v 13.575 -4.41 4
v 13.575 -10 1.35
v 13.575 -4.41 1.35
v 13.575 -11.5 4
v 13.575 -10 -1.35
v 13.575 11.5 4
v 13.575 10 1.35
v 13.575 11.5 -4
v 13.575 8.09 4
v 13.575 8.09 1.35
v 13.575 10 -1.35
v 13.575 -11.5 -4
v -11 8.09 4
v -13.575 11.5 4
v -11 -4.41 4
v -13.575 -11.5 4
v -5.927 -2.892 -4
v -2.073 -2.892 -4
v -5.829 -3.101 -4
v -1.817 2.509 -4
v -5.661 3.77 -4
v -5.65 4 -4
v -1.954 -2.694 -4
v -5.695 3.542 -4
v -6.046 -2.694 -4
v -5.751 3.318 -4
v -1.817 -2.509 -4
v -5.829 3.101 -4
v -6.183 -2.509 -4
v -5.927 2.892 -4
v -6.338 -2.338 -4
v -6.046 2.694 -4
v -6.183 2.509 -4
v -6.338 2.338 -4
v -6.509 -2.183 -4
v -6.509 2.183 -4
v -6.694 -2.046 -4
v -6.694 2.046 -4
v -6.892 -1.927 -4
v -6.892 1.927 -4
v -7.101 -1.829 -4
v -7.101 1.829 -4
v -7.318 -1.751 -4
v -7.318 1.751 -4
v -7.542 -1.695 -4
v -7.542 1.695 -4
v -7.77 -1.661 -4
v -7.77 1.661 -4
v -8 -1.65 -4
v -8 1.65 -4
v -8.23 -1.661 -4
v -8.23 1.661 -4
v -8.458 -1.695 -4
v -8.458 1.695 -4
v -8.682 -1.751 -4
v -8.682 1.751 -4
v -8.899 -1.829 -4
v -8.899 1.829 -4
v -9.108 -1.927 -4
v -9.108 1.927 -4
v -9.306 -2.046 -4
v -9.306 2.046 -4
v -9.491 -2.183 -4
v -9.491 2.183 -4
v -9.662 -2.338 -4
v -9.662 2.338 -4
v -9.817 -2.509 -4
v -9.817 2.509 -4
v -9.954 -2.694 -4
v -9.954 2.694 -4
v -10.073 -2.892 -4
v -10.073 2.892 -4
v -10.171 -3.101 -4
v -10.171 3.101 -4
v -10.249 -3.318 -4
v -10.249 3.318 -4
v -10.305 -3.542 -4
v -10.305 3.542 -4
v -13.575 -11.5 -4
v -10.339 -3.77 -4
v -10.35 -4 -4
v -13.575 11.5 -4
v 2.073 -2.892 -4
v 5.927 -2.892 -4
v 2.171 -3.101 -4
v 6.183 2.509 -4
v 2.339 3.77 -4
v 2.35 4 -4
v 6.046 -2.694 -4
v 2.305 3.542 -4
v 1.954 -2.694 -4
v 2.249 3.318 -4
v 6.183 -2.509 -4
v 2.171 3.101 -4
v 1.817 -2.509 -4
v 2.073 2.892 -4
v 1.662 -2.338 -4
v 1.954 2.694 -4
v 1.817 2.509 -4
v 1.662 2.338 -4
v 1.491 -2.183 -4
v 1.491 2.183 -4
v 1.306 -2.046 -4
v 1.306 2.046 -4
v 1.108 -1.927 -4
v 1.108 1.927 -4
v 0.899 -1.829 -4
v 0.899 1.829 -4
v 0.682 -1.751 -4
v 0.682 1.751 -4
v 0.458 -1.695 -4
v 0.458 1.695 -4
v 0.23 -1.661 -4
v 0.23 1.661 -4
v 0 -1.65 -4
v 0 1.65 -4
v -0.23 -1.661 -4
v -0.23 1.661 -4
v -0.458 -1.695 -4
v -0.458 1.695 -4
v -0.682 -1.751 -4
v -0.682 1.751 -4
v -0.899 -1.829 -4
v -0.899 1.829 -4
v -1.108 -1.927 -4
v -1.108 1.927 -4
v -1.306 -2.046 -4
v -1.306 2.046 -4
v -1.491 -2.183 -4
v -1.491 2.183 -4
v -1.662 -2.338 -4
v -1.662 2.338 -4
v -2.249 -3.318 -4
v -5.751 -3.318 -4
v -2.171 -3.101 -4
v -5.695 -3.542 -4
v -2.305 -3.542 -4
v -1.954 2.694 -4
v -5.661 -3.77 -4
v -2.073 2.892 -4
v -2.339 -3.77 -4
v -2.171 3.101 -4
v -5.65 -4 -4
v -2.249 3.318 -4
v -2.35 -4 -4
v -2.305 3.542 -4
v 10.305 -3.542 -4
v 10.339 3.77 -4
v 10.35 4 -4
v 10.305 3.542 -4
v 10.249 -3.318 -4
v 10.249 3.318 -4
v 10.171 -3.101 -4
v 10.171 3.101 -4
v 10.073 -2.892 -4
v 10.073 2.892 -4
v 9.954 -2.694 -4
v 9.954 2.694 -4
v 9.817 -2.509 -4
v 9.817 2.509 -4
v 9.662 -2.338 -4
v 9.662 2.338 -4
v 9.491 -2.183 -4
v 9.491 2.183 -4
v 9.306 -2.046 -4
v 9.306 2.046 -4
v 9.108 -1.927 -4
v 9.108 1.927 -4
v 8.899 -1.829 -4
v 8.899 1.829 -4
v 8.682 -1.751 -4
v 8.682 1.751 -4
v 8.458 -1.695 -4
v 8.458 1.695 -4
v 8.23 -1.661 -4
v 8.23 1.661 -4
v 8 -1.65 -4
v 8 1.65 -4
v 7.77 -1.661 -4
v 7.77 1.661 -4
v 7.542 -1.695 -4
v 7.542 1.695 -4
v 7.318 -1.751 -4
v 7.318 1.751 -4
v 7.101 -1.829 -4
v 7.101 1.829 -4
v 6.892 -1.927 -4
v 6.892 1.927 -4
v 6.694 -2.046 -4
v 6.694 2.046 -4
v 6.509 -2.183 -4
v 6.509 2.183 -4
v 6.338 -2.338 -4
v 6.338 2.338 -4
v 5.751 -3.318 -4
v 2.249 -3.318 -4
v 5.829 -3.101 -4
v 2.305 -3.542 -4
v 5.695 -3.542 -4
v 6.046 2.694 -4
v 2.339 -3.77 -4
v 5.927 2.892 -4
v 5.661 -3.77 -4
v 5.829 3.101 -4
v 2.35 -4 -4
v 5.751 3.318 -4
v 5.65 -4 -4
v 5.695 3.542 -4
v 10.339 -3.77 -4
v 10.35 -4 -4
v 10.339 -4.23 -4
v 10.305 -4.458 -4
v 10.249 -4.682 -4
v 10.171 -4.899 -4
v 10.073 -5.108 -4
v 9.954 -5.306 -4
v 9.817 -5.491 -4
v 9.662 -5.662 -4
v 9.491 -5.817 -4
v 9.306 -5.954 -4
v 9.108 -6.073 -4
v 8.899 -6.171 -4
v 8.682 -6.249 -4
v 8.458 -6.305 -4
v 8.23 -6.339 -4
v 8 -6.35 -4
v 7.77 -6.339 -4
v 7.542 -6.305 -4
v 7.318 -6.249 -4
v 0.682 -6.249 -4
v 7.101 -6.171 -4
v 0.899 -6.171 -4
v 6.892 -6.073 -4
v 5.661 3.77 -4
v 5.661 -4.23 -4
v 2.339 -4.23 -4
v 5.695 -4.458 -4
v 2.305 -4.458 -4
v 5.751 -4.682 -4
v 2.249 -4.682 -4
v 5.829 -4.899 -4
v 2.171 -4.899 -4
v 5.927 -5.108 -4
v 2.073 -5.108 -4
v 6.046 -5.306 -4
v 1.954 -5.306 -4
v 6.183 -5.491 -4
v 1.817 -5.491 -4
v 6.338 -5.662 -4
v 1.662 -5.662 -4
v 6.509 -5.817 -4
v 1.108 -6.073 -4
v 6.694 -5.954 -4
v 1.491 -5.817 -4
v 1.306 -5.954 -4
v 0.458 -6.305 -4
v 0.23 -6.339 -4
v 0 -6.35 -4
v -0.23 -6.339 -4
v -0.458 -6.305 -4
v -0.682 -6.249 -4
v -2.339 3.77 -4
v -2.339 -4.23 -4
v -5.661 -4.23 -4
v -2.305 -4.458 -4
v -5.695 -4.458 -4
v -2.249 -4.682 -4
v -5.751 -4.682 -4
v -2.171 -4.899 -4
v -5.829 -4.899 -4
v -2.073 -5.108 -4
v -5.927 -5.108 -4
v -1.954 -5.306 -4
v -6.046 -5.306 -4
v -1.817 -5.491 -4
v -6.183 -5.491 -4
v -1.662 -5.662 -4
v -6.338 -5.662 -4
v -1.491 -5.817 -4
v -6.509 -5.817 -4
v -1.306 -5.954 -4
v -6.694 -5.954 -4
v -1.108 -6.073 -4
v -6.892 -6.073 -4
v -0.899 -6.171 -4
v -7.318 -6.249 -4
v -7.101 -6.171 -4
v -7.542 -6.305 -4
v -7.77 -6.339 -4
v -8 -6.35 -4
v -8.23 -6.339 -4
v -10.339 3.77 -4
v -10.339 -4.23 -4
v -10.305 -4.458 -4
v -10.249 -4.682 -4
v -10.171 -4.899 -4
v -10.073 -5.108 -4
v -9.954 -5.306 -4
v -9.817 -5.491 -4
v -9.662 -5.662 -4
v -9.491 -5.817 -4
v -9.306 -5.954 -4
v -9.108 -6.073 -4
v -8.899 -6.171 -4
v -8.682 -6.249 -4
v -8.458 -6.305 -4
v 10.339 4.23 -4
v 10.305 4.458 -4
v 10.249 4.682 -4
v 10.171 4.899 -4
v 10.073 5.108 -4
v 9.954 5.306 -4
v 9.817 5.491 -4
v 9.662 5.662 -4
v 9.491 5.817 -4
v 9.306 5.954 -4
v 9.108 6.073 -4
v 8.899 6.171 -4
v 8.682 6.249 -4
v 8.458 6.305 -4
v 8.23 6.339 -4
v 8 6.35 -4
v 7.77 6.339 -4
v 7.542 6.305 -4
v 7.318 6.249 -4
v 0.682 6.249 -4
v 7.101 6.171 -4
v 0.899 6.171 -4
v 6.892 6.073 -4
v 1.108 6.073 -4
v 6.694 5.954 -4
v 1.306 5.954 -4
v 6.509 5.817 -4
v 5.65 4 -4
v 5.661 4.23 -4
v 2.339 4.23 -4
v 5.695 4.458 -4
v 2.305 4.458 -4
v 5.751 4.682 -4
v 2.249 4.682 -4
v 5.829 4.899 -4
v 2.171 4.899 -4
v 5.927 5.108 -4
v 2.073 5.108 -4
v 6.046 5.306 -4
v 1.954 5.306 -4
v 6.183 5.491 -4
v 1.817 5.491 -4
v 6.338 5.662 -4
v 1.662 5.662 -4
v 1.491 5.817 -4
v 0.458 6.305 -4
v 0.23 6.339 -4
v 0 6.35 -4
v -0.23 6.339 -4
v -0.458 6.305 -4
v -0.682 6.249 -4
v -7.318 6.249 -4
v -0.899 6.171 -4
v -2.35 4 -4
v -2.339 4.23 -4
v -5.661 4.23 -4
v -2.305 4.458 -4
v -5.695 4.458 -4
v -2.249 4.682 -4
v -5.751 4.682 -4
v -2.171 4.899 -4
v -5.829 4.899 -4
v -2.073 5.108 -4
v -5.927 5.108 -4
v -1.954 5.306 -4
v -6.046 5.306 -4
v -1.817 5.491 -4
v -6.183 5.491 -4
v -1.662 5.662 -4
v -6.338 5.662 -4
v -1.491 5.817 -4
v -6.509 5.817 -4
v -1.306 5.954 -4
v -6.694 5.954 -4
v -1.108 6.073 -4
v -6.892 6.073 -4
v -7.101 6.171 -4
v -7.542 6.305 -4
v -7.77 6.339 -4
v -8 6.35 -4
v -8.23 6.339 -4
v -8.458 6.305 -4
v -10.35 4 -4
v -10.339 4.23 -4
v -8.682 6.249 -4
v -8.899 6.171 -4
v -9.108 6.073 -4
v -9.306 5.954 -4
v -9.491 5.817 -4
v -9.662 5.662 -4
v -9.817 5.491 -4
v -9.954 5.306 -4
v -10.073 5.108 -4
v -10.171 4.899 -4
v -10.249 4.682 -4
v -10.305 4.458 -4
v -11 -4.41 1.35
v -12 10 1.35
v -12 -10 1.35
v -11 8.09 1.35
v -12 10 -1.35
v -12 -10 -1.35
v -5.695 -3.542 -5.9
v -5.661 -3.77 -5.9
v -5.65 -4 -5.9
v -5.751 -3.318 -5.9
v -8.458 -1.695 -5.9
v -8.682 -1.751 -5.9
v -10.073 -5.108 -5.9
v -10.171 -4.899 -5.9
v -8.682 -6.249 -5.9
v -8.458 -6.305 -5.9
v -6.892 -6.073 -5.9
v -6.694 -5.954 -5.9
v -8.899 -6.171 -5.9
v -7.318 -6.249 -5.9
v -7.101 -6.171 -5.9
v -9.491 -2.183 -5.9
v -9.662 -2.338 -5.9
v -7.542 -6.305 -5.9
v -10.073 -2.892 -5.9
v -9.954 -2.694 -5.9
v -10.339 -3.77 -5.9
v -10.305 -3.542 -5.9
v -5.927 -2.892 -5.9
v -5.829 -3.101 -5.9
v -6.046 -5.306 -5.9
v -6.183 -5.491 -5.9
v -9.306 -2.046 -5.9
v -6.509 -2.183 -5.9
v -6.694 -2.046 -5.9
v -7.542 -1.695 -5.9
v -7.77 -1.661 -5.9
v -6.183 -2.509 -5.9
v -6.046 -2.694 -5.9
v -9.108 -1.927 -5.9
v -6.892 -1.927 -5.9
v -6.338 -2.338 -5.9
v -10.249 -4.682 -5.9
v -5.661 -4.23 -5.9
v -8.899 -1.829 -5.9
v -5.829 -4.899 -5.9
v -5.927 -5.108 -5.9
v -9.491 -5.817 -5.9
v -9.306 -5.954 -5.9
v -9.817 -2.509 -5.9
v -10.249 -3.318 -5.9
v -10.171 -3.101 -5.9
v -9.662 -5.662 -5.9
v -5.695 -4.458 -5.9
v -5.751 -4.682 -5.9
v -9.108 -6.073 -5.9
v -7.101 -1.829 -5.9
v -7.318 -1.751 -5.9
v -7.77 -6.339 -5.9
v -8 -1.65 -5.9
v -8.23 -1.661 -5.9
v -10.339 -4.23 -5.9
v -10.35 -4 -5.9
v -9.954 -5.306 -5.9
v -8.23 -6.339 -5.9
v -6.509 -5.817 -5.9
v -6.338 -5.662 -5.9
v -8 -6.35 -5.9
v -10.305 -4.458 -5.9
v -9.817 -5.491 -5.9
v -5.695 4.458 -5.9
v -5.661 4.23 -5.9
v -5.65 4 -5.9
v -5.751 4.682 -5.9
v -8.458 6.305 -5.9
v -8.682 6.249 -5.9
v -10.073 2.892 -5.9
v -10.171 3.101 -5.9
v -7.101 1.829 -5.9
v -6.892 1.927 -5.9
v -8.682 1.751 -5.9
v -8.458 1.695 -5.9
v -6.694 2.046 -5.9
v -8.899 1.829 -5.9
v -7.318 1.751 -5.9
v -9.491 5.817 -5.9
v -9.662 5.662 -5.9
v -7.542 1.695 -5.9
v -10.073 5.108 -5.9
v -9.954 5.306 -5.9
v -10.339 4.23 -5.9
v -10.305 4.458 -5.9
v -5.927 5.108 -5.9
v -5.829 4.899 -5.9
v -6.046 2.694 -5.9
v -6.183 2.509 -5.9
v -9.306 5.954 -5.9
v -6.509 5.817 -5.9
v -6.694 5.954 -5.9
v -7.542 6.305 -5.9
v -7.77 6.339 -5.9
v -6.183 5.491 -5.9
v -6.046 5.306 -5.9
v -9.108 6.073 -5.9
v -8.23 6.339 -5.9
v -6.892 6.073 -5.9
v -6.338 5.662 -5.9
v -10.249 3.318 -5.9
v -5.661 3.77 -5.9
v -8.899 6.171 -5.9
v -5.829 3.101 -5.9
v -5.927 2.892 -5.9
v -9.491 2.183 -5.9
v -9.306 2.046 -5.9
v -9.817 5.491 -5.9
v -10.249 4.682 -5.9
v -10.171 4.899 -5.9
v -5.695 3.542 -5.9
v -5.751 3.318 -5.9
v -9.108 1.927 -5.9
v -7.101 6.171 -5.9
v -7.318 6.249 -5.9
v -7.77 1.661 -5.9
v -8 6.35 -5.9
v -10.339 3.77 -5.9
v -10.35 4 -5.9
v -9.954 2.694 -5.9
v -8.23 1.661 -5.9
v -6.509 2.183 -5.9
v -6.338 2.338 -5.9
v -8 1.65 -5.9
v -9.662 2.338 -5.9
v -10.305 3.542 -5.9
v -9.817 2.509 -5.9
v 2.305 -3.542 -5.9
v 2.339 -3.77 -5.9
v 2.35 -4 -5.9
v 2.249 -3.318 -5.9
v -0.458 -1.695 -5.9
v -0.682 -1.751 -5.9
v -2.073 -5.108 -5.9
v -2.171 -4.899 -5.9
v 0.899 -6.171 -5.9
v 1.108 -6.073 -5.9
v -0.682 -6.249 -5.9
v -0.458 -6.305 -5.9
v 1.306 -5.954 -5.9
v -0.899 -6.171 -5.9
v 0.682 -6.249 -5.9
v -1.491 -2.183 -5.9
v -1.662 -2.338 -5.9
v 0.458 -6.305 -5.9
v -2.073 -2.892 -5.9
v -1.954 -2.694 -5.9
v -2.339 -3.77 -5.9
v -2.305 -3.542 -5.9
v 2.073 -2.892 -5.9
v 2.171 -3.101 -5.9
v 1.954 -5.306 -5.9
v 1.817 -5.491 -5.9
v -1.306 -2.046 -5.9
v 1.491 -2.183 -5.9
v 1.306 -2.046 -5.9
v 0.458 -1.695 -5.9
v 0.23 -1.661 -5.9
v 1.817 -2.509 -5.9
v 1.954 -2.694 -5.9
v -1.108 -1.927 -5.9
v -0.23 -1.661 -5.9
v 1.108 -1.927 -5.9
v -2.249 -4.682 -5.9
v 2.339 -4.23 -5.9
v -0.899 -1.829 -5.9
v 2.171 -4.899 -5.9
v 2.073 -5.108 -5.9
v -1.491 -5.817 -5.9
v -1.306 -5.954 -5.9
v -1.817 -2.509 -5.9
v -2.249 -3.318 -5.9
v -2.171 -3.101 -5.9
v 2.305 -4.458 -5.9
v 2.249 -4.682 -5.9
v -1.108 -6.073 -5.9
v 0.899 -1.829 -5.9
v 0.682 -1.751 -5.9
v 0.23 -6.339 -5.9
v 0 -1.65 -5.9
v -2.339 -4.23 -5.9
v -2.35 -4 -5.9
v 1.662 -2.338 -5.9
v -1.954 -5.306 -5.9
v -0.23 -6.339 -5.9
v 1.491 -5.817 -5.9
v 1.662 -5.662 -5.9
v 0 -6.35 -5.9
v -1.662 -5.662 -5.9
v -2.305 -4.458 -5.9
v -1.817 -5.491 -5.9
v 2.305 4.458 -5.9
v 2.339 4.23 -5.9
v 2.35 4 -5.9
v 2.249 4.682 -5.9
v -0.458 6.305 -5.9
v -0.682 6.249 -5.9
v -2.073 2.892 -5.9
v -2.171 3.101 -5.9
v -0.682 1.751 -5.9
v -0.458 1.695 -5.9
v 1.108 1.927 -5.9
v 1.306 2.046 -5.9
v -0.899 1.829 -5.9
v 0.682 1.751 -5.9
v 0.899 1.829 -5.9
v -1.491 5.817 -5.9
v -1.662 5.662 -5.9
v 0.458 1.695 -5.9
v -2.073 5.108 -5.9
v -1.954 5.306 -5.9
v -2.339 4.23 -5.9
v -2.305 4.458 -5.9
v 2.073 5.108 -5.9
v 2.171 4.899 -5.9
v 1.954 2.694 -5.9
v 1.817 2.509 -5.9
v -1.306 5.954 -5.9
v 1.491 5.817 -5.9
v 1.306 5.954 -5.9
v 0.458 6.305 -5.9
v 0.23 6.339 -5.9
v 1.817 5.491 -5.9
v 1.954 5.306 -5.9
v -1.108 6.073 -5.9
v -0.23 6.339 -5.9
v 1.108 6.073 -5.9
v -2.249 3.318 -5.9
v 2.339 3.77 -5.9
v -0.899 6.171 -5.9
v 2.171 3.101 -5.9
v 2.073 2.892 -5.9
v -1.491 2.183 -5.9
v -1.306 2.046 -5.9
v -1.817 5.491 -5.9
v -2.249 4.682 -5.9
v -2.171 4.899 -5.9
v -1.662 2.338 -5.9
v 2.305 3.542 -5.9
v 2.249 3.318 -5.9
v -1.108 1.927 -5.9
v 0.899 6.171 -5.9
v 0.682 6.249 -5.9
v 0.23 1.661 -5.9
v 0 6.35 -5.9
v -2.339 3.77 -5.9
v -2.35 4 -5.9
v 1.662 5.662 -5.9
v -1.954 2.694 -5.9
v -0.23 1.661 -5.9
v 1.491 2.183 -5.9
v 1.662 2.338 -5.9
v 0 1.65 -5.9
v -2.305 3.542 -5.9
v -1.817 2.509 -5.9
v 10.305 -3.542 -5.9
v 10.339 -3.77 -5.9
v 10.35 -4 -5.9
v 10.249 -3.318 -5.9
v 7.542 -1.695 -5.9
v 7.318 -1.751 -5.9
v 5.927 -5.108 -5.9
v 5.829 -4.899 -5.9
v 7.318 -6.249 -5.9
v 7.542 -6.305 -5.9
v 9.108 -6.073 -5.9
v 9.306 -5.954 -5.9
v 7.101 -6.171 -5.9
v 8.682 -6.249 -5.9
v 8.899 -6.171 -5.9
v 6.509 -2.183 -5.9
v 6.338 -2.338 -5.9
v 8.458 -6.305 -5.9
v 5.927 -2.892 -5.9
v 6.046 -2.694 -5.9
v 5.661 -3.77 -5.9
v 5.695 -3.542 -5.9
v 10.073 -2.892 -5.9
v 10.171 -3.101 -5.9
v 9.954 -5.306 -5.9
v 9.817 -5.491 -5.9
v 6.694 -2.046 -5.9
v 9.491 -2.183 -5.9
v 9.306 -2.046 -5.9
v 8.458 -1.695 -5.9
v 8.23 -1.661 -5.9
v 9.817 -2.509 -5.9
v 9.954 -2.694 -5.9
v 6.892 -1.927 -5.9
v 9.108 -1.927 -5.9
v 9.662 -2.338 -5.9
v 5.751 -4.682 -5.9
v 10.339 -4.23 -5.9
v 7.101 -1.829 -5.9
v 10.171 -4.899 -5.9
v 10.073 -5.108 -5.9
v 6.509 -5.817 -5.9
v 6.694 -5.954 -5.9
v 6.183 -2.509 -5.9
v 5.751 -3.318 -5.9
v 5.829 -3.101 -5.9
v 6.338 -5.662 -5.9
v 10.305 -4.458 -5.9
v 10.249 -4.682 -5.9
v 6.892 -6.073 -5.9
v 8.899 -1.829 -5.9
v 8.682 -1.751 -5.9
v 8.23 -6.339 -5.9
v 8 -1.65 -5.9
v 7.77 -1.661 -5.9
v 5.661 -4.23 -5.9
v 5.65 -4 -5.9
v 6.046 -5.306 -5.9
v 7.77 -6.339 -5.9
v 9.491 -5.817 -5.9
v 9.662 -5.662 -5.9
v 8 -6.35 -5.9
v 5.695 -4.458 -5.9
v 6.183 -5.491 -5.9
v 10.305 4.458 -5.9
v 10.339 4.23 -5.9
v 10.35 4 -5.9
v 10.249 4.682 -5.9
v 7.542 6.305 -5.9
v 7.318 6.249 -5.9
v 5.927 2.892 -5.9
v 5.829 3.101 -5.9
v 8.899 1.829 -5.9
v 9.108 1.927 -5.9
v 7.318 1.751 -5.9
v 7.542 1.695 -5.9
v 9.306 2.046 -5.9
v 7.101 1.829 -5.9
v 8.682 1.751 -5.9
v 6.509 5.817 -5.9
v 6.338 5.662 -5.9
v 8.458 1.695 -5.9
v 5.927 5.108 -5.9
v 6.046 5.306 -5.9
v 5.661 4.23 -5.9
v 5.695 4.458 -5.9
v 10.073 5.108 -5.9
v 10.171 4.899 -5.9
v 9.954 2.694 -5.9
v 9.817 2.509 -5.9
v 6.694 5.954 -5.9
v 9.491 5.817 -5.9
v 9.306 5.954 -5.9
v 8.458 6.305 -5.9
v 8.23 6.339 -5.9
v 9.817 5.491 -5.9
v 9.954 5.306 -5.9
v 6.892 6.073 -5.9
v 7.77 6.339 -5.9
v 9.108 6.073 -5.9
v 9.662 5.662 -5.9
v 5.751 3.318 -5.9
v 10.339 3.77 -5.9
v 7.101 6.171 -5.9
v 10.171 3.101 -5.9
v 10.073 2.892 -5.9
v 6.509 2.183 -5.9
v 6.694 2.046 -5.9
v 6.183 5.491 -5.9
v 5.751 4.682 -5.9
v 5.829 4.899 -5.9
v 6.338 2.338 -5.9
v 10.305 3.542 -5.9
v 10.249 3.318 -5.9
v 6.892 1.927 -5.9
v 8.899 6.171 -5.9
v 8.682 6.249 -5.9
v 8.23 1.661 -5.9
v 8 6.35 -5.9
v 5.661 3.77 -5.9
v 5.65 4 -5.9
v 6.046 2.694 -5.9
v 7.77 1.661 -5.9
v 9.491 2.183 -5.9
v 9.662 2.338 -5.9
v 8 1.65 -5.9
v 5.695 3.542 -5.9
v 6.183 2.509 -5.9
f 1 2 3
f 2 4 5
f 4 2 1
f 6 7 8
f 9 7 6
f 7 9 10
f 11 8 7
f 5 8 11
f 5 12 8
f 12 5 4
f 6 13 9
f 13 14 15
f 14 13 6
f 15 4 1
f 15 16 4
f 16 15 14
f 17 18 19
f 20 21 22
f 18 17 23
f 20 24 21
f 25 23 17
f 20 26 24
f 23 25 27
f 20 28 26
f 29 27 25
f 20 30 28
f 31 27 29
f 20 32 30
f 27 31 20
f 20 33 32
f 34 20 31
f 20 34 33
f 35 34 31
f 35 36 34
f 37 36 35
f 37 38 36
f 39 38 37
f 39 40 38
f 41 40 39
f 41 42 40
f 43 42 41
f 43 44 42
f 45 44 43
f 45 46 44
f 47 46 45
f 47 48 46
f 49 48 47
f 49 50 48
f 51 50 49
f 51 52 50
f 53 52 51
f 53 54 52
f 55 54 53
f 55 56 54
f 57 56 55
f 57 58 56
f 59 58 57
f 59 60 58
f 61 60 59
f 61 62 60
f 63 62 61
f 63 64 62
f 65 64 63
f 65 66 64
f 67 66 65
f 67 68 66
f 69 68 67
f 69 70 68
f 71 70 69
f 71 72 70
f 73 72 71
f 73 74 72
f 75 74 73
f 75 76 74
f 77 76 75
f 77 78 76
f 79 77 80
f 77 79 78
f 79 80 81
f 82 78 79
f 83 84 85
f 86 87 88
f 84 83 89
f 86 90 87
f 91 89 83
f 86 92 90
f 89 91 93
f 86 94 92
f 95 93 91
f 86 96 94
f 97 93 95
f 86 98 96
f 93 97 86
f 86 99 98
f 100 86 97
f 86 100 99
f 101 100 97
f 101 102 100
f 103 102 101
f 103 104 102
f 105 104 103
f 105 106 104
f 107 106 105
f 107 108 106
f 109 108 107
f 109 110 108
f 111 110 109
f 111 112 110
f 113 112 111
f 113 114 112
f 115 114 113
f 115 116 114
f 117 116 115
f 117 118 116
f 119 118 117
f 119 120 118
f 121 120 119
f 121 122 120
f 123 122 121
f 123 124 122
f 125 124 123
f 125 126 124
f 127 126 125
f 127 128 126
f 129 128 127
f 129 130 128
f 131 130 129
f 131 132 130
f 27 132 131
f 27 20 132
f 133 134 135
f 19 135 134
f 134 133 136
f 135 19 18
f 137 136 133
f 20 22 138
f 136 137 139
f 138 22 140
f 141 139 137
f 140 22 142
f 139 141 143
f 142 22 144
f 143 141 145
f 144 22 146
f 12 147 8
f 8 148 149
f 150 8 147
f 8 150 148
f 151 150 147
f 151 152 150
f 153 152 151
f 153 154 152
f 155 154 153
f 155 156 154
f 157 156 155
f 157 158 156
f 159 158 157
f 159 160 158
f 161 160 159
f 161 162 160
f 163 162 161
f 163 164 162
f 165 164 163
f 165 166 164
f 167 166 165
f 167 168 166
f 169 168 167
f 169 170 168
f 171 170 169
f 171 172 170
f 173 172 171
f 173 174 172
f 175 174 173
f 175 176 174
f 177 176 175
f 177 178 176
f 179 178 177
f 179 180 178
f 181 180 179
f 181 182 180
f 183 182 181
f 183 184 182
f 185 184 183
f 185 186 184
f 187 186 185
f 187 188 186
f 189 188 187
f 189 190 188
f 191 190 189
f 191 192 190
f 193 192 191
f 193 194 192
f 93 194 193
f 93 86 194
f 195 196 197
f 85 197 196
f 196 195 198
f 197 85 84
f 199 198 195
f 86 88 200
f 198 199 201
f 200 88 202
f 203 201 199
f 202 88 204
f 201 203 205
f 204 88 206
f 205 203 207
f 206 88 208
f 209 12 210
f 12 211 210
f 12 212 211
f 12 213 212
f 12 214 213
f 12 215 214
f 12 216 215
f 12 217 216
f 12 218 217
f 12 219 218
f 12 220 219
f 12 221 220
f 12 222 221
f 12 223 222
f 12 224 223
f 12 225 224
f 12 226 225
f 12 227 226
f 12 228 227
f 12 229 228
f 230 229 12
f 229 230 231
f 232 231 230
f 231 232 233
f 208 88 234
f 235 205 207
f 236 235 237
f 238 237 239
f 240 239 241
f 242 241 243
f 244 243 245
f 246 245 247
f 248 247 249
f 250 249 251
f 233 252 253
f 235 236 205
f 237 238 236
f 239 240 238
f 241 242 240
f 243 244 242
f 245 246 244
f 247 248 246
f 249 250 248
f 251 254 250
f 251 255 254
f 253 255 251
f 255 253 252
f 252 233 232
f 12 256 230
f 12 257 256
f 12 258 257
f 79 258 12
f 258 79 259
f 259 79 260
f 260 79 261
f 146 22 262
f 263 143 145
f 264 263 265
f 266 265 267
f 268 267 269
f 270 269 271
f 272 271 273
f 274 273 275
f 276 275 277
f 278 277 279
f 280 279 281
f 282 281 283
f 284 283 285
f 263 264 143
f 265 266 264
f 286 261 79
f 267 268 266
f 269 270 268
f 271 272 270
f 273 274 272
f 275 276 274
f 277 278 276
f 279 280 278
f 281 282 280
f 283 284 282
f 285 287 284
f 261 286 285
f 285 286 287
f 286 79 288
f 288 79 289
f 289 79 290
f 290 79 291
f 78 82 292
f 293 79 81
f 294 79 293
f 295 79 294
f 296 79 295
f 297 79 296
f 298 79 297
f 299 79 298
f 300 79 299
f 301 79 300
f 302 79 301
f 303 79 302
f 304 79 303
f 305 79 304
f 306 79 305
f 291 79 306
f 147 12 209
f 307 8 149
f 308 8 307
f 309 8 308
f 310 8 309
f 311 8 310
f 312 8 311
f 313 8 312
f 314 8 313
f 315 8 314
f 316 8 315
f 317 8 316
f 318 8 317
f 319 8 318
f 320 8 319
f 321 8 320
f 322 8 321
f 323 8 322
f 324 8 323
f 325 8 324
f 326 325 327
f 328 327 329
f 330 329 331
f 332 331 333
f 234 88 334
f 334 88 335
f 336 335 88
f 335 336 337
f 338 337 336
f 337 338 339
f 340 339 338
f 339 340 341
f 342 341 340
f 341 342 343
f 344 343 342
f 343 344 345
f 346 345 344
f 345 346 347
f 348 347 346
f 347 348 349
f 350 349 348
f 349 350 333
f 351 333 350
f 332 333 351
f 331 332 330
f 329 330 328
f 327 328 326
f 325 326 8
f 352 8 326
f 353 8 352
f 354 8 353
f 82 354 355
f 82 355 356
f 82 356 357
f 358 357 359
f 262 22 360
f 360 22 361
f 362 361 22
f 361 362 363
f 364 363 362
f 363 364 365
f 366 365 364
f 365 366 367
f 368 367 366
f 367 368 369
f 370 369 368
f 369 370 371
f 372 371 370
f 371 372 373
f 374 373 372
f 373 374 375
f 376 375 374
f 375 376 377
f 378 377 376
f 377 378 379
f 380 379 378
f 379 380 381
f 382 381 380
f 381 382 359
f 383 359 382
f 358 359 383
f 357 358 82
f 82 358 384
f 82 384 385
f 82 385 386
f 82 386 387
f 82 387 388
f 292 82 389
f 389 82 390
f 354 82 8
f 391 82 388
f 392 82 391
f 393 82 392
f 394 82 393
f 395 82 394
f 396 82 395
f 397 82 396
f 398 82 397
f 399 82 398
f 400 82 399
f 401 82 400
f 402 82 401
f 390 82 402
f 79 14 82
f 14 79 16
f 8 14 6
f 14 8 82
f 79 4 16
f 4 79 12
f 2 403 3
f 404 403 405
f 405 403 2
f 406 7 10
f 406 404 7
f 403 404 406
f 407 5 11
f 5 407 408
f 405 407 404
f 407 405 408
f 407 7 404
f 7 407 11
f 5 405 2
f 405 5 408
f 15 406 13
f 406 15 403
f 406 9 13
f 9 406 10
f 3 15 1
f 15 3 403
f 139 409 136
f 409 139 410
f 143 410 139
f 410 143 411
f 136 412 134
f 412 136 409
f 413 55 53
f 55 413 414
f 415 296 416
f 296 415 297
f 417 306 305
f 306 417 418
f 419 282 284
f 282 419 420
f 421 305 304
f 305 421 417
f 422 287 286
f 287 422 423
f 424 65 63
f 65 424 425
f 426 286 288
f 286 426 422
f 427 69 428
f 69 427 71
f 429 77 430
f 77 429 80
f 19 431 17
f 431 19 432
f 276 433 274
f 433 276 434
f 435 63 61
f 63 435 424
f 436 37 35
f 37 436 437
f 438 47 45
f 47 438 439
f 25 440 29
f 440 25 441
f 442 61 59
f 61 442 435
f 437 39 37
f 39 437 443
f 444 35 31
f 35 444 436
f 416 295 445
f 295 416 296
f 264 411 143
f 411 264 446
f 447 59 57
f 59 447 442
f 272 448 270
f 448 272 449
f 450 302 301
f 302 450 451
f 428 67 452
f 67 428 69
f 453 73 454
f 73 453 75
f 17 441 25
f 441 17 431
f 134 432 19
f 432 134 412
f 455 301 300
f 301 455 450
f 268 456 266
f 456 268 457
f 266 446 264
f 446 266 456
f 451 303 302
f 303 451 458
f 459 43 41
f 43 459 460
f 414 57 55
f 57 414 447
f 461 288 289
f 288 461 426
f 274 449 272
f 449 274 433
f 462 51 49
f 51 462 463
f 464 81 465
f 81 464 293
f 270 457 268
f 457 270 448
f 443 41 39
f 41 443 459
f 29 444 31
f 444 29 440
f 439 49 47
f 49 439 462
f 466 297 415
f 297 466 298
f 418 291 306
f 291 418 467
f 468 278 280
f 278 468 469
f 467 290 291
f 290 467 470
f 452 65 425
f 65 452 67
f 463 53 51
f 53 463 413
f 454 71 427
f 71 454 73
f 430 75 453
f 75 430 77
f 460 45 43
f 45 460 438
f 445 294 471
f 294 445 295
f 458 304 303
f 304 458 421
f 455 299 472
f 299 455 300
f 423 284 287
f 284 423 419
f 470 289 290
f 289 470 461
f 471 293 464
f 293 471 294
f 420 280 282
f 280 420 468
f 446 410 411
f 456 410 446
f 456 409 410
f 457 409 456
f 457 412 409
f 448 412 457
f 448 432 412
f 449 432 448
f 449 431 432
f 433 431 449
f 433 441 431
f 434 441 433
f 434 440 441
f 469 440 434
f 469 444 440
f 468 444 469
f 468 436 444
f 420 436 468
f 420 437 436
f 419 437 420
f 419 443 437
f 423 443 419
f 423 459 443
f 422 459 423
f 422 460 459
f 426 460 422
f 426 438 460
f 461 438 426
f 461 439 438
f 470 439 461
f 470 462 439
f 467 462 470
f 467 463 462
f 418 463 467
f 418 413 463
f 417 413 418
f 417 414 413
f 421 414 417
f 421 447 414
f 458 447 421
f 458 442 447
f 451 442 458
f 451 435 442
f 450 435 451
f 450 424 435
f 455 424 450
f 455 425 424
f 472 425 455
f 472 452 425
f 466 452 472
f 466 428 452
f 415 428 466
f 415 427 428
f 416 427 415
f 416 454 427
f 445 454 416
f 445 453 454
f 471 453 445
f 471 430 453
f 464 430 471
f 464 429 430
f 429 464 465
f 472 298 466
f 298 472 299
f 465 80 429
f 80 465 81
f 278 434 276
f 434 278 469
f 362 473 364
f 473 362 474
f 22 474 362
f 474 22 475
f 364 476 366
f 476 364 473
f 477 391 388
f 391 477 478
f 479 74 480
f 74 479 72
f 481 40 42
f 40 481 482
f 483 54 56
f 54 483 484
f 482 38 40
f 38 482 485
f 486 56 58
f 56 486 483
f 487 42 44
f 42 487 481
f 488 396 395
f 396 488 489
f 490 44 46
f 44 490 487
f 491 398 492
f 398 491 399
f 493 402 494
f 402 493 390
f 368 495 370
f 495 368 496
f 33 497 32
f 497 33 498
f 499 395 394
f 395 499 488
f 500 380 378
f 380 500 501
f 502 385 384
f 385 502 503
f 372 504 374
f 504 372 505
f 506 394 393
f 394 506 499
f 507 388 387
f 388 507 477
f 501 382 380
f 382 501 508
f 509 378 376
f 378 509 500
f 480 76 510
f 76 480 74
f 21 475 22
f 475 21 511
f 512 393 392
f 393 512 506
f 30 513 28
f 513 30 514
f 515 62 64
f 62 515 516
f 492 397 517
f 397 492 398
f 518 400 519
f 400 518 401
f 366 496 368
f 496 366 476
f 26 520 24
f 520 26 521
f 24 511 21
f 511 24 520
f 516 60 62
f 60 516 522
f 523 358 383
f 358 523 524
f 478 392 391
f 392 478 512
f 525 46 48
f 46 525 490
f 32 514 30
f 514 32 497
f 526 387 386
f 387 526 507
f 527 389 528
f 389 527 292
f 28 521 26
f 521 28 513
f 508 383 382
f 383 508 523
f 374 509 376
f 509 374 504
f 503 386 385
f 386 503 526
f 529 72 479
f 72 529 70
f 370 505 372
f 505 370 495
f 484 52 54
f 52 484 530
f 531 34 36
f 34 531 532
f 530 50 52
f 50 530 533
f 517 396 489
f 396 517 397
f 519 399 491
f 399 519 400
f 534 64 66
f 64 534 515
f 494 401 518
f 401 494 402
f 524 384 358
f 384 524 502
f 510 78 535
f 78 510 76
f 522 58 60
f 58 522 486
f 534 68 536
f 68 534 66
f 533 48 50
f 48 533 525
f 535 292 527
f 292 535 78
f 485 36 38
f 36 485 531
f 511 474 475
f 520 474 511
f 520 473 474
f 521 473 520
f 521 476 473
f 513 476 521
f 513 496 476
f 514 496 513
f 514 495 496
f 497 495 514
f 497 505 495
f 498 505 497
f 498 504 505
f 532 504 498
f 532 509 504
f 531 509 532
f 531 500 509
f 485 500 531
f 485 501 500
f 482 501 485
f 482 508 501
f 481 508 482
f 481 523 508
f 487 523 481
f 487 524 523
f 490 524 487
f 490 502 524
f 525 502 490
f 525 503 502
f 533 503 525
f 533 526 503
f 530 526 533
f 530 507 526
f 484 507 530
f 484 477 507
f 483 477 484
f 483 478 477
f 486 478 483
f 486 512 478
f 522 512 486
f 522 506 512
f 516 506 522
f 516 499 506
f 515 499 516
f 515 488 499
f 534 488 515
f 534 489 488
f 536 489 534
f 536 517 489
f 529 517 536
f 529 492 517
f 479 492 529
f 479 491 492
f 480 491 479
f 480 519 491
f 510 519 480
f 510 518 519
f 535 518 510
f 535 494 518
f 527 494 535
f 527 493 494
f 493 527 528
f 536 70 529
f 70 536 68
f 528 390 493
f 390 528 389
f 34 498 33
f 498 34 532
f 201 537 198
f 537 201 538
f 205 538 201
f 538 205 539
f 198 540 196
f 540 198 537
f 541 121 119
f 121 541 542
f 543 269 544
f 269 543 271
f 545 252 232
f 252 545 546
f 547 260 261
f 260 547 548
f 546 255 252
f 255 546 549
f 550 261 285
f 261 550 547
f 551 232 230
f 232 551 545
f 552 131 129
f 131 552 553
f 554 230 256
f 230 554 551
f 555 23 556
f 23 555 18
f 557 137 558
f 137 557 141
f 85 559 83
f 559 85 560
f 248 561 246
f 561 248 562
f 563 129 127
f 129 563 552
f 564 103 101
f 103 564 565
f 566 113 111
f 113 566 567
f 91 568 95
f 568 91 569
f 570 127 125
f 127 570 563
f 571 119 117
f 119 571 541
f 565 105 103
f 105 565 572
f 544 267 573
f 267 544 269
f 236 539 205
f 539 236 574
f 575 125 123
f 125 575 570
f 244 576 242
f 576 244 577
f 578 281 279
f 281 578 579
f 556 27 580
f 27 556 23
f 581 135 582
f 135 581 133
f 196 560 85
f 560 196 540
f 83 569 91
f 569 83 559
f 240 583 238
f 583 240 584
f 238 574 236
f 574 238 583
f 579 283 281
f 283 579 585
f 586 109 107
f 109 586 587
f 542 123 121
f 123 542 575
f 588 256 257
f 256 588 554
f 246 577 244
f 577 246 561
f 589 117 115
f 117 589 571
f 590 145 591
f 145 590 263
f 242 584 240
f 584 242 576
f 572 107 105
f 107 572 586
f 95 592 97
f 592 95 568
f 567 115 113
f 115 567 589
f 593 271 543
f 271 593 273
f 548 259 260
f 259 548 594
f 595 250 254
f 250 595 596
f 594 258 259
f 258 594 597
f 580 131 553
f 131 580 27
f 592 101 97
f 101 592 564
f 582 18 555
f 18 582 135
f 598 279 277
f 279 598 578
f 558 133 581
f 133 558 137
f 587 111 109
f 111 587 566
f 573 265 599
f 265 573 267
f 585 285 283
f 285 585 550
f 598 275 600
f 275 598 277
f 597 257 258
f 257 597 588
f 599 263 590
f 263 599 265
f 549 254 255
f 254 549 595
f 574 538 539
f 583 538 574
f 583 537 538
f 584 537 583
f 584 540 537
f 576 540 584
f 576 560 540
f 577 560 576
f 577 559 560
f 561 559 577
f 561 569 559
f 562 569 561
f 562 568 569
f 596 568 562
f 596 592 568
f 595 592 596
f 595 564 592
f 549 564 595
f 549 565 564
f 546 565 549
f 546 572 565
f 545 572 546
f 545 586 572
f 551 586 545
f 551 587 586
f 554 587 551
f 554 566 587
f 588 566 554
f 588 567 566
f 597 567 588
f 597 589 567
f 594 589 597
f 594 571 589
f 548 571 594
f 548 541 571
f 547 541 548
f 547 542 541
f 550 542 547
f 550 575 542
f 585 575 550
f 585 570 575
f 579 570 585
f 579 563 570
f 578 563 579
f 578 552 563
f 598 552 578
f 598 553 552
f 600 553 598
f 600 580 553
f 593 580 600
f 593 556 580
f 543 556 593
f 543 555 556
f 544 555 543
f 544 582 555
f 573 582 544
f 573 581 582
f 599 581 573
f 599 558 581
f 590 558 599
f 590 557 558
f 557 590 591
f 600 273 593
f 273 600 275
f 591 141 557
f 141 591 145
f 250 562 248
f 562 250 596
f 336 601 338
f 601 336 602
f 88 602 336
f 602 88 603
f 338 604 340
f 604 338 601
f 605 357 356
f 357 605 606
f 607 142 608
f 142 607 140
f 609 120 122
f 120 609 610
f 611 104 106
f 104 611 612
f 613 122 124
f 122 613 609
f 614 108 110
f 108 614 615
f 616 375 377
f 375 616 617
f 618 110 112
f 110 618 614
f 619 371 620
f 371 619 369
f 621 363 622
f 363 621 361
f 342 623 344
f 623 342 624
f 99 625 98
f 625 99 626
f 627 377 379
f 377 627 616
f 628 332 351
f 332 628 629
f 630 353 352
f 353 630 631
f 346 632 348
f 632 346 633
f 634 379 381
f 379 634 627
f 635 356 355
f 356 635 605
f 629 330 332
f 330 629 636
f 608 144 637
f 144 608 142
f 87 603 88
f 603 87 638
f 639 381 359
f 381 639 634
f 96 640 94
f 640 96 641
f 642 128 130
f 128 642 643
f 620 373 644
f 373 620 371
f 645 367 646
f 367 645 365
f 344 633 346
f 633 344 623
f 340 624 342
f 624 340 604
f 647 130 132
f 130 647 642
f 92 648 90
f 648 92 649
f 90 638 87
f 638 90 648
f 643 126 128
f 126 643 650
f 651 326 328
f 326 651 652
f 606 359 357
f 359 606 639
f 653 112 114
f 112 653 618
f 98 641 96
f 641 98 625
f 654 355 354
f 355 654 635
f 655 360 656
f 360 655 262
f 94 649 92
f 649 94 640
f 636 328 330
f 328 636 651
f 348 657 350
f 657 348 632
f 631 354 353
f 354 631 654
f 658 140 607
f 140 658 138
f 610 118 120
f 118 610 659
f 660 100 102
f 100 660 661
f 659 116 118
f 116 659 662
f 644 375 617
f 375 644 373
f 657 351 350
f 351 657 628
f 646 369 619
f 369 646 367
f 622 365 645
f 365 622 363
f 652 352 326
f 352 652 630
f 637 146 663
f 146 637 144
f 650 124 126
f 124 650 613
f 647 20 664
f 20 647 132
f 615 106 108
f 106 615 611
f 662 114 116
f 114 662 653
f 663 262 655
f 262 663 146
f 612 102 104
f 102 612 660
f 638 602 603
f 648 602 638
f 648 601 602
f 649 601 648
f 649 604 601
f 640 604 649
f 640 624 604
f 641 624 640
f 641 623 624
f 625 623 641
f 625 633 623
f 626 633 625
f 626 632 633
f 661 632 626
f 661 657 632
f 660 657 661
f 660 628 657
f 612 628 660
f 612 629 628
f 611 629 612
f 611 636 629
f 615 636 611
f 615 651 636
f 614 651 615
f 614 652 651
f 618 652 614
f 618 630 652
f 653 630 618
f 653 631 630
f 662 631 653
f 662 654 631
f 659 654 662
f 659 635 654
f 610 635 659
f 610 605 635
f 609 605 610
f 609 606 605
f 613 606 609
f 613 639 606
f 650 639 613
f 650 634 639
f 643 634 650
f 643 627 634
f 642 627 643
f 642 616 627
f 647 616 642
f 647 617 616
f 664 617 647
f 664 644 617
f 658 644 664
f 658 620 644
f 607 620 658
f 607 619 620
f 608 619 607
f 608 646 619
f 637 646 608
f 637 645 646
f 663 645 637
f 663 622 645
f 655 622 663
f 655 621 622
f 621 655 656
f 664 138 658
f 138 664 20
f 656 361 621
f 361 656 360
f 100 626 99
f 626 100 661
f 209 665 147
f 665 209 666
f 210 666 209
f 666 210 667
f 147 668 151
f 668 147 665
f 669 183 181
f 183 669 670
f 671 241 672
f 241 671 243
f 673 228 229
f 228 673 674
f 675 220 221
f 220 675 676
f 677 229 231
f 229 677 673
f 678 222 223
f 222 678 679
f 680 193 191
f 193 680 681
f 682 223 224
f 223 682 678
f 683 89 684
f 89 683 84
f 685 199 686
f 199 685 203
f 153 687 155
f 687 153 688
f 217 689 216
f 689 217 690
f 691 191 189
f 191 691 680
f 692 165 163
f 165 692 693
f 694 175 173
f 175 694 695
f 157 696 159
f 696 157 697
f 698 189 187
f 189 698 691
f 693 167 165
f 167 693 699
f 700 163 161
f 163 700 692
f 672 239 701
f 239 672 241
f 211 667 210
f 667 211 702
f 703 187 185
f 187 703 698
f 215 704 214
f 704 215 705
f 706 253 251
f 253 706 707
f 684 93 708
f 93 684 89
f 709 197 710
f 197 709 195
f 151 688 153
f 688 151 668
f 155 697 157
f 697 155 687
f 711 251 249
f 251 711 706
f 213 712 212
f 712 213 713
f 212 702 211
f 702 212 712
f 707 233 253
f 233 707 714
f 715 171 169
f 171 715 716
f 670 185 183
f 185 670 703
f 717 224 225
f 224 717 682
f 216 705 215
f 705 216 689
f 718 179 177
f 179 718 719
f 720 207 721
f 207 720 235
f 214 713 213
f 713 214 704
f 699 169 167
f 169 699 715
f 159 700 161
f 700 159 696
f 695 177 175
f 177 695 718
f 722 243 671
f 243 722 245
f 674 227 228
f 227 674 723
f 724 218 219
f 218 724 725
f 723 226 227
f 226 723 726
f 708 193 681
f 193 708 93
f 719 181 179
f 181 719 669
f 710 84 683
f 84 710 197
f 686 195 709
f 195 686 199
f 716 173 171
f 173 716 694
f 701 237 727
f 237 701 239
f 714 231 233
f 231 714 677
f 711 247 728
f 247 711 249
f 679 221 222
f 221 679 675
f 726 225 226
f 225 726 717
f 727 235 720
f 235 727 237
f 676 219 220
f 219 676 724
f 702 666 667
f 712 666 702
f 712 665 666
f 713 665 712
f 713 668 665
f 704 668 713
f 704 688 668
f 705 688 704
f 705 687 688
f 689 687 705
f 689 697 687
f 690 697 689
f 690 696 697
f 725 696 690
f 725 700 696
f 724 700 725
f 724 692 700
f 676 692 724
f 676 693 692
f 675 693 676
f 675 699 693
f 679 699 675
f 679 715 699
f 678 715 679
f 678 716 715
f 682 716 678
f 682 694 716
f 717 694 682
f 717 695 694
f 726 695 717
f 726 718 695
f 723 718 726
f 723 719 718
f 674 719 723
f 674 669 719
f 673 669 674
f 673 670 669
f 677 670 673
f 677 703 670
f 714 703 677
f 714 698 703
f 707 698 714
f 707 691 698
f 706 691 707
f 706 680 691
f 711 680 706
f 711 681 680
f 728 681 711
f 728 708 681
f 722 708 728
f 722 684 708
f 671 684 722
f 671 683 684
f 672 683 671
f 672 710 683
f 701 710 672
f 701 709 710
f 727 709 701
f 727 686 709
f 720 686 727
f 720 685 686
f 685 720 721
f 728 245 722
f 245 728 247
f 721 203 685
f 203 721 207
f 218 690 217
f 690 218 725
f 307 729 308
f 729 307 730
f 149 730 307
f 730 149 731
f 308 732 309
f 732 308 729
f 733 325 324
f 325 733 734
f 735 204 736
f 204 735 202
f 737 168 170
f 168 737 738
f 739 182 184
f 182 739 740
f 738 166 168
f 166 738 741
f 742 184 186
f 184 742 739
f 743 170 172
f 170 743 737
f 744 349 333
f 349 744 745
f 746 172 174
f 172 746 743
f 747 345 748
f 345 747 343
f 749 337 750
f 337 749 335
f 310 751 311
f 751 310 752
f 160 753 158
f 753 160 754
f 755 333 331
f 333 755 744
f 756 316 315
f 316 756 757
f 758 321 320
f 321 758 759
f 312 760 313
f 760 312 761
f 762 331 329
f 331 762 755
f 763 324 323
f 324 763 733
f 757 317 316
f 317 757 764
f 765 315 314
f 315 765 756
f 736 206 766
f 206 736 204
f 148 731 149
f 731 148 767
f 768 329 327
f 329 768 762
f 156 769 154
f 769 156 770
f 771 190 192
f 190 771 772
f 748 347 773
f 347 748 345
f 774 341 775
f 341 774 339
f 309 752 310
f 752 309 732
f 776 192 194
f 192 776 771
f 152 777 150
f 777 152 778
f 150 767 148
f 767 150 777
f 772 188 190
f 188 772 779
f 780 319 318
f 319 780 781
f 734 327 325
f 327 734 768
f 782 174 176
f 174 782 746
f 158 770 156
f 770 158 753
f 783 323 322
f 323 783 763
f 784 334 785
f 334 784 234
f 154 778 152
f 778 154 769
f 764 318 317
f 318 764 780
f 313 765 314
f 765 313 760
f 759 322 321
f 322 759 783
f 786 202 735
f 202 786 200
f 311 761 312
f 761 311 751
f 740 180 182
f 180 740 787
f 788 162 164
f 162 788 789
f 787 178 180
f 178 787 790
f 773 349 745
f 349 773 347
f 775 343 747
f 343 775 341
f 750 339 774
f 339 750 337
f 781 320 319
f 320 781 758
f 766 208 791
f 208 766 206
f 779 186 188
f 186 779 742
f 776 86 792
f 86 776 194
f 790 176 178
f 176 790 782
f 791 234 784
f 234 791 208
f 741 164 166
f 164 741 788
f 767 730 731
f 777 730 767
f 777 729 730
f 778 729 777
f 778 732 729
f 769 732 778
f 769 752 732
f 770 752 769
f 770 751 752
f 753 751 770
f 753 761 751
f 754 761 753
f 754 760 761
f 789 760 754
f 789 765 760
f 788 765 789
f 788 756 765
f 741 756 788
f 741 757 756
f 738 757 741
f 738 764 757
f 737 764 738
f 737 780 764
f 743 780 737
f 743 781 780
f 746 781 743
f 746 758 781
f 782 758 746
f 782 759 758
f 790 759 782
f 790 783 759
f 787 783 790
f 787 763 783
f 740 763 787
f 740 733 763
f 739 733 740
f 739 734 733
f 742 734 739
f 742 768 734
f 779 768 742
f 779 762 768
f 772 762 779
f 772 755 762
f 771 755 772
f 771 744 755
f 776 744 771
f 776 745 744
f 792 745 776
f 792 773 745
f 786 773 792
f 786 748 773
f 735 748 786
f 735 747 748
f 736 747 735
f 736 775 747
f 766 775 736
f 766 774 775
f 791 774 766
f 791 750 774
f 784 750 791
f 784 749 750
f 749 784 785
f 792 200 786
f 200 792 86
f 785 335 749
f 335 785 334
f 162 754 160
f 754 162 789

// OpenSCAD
print_width = 0.4; 
stud_diameter = 4.7;
stud_height = 1.8;
base_height = 3.0;
base_width = 8;
stud_offset = 0.5 * base_width;
edge_offset = 0.2;
edge_width = 0.5*(base_width-stud_diameter-0.2);
ring_diameter_outer = 6.2;
ring_diameter_inner = stud_diameter+0.2;
z_offset = 0.2;


b1 = 23;
l1 = 27.15;
h1 = 8;

b2 = 20;
l2 = 28;
h2 = 2.7;

b3 = 12.50;
l3 = 28;
h3 = 5;



module boxOutside(l,b,h)
{
    cube([l,b,h],center = true);

}

module boxInside(l,b,h)
{
    translate([2,0,0])
    cube([l,b,h],center = true);

}

module boxTopLayer(l,b,h)
{
    translate([3,1.84,1.9])
    cube([l,b,h],center = true);

}

module makeStuds(x, y, dia = stud_diameter)
{
    for(xPos=[stud_offset:base_width:stud_offset + (x-1) * base_width])
        for(yPos = [stud_offset:base_width:stud_offset + (y-1) * base_width])
            translate([xPos, yPos, 0])
                cylinder(d = dia, h = stud_height+1,center=true, $fn=64);
}


difference()
{
    boxOutside(l1, b1, h1);
    boxInside(l2, b2, h2);
    boxTopLayer(l3, b3, h3);
}

translate([-12,-8,-4.5])
makeStuds(3,2);
